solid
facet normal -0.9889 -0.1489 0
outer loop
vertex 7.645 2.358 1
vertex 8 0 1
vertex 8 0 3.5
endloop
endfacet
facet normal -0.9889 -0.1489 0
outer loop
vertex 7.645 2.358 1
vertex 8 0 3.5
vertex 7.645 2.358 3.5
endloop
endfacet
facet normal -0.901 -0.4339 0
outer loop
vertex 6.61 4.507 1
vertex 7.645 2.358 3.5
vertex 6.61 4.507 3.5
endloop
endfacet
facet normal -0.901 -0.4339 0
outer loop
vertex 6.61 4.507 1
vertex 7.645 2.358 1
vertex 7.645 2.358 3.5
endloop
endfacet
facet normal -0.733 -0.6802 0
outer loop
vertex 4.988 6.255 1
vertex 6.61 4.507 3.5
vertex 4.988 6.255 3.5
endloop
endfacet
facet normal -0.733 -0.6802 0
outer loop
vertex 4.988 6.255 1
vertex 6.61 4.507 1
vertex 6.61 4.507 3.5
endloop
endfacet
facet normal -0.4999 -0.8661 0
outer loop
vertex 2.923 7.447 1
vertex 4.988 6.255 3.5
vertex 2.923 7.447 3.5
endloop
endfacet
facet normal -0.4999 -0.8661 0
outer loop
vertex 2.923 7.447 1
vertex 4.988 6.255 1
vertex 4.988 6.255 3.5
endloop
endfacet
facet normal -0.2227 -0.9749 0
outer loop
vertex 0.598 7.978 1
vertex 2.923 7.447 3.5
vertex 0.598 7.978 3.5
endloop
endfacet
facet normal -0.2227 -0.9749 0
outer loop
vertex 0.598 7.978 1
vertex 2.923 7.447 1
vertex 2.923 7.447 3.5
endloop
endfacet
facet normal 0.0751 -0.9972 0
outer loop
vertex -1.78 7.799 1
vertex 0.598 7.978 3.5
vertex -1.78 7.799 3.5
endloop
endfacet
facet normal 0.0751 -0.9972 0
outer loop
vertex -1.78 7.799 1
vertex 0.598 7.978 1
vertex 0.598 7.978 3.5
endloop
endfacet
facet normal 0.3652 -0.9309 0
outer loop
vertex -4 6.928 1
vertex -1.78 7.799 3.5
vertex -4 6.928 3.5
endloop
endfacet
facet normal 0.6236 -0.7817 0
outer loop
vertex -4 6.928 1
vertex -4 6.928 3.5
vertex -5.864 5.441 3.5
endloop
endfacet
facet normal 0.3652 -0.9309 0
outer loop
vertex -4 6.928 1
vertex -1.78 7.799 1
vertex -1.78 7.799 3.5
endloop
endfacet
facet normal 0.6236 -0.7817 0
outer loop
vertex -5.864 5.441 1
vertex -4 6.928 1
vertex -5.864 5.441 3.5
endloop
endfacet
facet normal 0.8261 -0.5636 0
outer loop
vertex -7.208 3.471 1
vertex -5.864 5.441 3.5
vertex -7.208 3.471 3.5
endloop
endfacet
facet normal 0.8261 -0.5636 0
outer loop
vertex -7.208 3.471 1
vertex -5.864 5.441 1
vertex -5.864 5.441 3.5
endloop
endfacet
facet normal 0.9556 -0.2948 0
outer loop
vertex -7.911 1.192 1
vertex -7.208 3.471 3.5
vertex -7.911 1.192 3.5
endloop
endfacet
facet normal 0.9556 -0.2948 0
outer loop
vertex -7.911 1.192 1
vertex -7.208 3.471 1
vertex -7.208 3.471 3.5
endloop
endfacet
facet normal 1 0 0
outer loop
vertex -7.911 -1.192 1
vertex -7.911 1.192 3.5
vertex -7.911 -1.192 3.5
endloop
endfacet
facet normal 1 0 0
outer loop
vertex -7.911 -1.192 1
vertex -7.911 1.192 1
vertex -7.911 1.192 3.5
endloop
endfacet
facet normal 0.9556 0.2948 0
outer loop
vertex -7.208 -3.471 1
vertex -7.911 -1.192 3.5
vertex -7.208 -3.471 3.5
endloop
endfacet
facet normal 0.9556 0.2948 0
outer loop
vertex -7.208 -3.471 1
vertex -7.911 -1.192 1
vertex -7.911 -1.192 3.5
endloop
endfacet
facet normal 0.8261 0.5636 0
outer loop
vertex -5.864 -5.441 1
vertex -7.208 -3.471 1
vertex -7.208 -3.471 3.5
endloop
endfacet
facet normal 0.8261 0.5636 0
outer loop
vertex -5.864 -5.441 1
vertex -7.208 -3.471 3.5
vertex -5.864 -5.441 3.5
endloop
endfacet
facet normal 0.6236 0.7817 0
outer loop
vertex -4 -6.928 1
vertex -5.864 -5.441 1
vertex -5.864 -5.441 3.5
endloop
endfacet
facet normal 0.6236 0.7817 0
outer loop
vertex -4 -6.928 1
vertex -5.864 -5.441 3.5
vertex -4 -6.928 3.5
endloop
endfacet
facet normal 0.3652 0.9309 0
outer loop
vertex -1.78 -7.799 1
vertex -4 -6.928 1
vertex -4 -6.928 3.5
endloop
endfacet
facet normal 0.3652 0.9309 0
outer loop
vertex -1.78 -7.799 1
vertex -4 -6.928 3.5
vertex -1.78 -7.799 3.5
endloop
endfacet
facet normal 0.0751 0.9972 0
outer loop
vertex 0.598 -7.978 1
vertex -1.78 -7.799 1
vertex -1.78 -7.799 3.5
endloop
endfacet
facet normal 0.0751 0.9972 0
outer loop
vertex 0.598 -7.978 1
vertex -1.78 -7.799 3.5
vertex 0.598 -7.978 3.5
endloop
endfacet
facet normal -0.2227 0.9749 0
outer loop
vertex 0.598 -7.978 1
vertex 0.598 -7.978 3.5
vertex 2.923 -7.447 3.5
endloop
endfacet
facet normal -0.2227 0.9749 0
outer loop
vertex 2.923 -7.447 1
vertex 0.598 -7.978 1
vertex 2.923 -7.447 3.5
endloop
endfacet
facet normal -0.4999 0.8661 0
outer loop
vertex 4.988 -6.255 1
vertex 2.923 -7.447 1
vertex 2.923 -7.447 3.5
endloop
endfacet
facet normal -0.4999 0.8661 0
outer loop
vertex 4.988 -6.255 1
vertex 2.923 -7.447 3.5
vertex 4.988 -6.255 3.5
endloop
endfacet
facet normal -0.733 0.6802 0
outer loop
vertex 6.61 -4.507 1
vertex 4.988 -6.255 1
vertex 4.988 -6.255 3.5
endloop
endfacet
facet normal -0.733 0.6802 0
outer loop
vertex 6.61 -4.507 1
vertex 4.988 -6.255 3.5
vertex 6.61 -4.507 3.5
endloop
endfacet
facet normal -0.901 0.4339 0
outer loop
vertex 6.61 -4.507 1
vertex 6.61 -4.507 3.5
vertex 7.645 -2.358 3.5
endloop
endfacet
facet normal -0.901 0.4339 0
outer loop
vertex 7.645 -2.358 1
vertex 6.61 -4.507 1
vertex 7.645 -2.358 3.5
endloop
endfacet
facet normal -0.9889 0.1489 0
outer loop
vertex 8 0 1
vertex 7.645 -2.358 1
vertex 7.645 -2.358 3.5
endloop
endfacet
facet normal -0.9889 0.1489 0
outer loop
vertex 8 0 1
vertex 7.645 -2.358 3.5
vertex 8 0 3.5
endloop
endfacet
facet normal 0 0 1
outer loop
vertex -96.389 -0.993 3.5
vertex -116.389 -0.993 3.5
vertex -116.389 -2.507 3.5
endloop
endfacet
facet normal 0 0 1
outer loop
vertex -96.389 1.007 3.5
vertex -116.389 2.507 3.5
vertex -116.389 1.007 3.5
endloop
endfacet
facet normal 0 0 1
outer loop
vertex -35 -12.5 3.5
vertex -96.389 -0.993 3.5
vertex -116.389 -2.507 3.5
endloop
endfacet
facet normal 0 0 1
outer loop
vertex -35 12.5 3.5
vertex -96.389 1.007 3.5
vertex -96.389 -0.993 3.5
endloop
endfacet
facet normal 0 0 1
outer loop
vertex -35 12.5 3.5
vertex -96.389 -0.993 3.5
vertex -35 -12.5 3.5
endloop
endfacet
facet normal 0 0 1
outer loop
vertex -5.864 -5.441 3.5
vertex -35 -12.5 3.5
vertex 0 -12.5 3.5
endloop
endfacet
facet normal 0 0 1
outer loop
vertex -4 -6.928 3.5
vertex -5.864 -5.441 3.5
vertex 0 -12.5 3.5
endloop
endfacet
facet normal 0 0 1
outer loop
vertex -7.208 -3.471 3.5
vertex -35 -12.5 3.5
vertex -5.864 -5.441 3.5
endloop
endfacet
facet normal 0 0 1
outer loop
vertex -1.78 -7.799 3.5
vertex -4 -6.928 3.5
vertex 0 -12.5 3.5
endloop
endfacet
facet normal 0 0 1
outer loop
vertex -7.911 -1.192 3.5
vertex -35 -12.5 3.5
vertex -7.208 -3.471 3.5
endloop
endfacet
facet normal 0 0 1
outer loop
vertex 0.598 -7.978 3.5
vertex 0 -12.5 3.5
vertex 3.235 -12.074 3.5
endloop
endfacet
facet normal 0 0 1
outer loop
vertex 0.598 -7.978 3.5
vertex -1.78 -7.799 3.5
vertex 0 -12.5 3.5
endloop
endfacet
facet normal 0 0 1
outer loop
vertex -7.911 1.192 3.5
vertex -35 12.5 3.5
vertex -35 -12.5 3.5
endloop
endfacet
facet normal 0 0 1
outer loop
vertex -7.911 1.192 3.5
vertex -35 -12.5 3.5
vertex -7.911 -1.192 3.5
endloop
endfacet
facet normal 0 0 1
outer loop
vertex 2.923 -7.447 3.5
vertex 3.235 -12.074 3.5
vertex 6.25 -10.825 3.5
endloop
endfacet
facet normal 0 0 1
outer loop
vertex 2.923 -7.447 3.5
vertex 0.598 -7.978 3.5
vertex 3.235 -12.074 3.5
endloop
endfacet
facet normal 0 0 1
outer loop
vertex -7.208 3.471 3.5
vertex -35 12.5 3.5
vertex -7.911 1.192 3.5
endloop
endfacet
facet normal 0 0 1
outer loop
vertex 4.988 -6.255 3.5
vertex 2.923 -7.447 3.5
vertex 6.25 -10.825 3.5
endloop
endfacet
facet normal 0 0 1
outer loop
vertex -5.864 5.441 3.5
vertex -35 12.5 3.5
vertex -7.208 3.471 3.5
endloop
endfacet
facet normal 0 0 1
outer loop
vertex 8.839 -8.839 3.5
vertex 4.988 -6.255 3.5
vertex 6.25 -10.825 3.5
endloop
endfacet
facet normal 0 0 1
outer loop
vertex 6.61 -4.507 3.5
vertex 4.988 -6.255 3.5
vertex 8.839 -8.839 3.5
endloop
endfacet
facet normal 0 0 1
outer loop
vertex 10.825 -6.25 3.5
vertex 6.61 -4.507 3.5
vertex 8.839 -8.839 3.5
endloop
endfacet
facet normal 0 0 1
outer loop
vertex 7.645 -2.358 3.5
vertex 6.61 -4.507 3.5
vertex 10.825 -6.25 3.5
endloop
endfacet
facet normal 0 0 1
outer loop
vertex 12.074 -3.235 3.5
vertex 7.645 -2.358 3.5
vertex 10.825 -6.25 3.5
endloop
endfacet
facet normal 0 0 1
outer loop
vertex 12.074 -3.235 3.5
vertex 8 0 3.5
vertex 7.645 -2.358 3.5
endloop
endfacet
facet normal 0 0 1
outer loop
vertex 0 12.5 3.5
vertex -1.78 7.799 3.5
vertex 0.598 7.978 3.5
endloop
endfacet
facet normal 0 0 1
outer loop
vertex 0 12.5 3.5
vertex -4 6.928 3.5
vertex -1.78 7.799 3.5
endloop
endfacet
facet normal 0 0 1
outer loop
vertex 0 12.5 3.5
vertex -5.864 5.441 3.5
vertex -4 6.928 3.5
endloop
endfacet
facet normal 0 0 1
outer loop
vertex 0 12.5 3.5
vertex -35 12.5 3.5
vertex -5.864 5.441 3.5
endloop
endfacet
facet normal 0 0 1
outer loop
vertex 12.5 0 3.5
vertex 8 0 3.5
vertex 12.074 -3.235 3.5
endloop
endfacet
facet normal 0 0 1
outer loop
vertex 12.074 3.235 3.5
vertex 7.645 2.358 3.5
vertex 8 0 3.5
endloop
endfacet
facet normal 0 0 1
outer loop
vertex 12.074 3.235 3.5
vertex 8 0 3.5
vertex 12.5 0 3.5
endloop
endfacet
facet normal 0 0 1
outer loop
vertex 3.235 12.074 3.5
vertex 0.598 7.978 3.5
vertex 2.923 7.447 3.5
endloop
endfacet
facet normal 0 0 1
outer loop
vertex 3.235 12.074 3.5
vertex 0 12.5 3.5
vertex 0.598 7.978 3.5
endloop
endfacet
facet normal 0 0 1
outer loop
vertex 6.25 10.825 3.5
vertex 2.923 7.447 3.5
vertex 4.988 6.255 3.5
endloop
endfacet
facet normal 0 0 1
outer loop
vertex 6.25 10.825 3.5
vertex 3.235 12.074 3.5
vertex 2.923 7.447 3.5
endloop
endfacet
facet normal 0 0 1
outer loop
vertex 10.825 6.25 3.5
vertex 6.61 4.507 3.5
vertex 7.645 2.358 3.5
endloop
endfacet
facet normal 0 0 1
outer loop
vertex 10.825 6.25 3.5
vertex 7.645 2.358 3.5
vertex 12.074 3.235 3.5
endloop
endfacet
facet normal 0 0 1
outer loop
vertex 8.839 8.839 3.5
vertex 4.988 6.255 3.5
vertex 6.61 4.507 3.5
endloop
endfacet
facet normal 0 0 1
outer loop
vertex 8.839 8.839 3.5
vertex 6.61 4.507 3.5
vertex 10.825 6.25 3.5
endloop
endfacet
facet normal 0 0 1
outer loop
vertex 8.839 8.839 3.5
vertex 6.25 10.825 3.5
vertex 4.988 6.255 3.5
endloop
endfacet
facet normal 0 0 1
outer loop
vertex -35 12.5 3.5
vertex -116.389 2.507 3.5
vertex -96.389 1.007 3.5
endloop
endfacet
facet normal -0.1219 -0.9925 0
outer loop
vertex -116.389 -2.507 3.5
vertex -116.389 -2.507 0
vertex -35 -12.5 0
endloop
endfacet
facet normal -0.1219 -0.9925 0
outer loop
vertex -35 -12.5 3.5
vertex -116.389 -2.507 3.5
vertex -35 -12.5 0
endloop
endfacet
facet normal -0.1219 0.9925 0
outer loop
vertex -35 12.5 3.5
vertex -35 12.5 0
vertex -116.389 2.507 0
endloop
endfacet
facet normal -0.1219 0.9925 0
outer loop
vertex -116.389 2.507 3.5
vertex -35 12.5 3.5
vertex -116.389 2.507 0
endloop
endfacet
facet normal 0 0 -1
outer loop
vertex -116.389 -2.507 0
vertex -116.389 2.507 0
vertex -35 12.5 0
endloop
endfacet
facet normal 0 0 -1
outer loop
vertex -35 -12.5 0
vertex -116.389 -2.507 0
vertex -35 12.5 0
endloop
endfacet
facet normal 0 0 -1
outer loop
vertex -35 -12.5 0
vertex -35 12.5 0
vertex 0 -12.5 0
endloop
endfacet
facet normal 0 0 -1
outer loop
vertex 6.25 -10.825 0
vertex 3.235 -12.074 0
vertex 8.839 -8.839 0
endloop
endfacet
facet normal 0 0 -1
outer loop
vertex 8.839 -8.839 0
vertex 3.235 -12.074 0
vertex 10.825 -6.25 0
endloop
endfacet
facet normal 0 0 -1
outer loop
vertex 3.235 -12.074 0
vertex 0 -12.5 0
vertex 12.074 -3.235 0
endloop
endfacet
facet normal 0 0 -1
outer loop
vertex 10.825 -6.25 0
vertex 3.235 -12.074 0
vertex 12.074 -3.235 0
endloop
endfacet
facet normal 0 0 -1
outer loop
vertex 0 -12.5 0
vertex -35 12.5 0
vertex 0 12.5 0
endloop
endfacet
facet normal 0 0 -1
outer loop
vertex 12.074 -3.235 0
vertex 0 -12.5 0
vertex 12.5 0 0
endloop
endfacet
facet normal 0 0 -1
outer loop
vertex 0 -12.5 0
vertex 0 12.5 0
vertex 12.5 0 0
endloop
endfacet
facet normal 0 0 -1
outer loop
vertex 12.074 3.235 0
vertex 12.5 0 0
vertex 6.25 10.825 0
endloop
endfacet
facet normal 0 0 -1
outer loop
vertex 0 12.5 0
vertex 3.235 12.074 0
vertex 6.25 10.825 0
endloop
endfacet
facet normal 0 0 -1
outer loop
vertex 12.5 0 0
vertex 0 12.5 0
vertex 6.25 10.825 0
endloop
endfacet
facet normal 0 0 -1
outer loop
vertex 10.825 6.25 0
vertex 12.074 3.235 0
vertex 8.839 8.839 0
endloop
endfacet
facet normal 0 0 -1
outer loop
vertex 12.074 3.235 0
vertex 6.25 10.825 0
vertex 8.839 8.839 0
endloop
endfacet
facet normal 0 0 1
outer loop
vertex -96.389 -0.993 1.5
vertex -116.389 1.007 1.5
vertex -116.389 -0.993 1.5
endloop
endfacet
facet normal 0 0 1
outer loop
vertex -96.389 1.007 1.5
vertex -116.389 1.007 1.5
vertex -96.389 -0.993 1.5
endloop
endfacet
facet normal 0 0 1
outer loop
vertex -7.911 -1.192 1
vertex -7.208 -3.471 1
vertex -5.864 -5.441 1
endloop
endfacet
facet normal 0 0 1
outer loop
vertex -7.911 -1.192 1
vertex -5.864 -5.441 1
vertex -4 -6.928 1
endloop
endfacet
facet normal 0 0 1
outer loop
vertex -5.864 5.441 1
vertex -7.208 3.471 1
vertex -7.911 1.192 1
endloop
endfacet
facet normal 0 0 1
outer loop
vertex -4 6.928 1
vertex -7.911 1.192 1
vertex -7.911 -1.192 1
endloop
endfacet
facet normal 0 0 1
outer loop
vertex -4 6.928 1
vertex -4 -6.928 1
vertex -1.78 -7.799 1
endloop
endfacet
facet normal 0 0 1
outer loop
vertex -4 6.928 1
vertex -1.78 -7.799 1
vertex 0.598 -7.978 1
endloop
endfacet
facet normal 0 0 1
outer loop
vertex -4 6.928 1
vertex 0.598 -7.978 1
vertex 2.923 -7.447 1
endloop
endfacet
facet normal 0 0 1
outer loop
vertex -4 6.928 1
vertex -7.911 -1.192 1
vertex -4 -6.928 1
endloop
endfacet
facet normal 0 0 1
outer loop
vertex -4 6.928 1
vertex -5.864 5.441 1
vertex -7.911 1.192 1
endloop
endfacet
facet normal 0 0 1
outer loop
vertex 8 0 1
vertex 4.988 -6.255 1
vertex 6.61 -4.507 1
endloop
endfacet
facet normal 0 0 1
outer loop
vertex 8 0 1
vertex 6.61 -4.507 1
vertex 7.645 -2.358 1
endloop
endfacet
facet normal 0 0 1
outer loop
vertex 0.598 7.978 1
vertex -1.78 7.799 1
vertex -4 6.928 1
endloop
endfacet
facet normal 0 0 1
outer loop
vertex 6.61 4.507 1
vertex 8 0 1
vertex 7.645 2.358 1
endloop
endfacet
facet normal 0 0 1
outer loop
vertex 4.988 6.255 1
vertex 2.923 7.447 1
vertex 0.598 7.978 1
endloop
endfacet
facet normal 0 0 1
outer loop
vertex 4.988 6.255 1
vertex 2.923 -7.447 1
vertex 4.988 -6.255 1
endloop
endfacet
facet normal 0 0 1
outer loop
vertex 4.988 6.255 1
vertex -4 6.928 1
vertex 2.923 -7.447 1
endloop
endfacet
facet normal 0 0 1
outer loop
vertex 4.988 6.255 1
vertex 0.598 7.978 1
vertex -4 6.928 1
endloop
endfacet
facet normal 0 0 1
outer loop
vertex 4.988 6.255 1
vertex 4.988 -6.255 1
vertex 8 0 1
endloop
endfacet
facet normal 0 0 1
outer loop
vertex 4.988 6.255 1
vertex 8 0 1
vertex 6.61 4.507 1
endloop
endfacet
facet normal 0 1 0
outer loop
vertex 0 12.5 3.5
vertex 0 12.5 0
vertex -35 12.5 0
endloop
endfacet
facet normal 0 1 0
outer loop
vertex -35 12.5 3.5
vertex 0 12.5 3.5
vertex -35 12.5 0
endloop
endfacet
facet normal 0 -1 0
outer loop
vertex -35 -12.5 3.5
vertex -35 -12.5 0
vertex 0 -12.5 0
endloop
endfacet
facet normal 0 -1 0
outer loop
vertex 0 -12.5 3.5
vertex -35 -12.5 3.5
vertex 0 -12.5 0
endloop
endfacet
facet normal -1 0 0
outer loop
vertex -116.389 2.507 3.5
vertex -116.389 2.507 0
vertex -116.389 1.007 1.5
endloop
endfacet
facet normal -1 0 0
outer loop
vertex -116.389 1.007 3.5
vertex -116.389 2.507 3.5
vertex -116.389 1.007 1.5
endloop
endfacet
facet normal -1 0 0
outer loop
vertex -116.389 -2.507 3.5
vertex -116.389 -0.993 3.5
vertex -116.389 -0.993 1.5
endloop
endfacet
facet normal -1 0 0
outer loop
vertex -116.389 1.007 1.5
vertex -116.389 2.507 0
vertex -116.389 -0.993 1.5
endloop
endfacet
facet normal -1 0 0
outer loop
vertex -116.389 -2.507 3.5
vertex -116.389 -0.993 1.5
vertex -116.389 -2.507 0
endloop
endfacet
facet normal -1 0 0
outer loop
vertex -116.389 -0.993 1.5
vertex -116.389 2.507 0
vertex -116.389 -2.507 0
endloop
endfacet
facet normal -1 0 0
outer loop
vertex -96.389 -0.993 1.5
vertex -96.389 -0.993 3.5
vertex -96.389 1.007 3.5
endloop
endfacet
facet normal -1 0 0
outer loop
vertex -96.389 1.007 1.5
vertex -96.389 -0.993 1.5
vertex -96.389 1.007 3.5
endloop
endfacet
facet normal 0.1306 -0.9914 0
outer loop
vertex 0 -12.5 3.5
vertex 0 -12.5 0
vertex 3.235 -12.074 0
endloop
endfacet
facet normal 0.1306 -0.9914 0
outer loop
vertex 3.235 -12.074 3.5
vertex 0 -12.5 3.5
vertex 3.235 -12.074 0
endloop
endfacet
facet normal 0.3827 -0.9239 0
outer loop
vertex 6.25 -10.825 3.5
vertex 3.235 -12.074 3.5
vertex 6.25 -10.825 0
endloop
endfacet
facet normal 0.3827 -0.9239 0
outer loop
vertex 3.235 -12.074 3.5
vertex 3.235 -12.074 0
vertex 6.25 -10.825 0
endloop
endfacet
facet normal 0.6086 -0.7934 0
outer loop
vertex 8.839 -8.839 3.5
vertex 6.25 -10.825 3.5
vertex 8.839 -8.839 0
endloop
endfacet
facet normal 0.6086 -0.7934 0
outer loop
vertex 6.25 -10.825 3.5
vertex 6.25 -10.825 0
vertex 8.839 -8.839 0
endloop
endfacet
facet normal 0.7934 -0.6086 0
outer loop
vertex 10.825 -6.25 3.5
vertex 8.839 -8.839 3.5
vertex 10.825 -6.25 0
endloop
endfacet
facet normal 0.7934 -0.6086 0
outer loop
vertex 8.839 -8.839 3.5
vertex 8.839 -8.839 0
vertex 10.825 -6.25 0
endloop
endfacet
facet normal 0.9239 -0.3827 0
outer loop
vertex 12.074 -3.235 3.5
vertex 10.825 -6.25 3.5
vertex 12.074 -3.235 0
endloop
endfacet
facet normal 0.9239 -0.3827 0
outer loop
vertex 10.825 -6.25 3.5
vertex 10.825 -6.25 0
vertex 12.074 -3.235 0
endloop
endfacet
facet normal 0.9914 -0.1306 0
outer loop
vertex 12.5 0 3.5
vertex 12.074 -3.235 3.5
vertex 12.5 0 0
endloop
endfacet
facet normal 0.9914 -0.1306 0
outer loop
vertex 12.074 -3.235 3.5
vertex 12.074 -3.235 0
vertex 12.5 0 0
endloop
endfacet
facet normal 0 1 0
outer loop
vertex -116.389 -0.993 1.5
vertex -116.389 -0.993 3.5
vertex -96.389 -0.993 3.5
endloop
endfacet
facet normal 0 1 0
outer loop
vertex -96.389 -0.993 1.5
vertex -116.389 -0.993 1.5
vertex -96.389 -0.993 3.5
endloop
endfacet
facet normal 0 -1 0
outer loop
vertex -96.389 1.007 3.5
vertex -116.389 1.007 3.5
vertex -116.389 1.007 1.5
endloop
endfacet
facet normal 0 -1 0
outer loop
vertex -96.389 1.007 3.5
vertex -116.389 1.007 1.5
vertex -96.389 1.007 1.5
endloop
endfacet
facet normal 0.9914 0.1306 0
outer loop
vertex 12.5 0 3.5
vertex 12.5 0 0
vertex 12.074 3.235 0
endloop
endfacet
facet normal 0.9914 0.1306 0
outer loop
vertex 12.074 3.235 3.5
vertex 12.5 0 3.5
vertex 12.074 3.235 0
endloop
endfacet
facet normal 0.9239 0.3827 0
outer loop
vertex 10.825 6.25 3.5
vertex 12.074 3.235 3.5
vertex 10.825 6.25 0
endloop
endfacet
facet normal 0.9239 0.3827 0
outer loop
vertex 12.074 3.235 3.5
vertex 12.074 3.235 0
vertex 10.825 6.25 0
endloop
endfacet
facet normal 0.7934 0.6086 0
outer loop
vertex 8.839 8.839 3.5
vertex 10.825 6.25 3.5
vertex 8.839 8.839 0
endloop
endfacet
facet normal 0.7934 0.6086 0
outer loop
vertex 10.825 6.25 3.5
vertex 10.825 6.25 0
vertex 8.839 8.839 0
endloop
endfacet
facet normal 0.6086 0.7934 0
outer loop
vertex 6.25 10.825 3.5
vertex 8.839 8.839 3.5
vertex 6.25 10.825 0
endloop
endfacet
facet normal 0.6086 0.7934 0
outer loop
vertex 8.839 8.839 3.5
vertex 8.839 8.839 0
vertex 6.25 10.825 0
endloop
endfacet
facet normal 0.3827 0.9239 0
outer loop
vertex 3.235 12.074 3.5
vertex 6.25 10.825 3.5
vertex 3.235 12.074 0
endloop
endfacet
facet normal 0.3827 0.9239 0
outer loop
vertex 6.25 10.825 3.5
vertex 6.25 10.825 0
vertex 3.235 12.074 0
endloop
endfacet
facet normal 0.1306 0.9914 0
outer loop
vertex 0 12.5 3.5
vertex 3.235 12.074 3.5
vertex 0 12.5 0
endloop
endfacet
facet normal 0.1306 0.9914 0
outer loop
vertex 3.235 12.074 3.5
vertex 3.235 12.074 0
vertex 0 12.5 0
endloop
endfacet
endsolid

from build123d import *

# Parameters (mm, degrees)
F0_R     = 8
F1_DEPTH = 3.5
F2_DEPTH = 1
F3_W     = 20
F3_H     = 2
F4_DEPTH = 2


with BuildPart() as f1:
    # F0 (on Top) → F1 (new body)
    with BuildSketch(Plane.XY):
        with BuildLine():
            ThreePointArc((0, -12.5), (8.838835, -8.838835), (12.5, 0))
            ThreePointArc((12.5, 0), (8.838835, 8.838835), (0, 12.5))
            ThreePointArc((0, 12.5), (-12.5, 0), (0, -12.5))
        make_face()
        Circle(F0_R, mode=Mode.SUBTRACT)
        with BuildLine():
            ThreePointArc((0, -12.5), (-12.5, 0), (0, 12.5))
            Line((0, 12.5), (-35, 12.5))
            Line((-35, 12.5), (-116.388784, 2.506714))
            Line((-116.388784, 2.506714), (-116.388784, -2.506714))
            Line((-116.388784, -2.506714), (-35, -12.5))
            Line((-35, -12.5), (0, -12.5))
        make_face()
    extrude(amount=F1_DEPTH)

    # F0 (on Top) → F2 (join)
    with BuildSketch(Plane.XY):
        Circle(F0_R)
    extrude(amount=F2_DEPTH)

    # F3 (on face) → F4 (cut)
    with BuildSketch(Plane.XY.offset(3.5)):
        with Locations((-106.388784, 0.006714)):
            Rectangle(F3_W, F3_H)
    extrude(amount=-F4_DEPTH, mode=Mode.SUBTRACT)


solid = f1.part
